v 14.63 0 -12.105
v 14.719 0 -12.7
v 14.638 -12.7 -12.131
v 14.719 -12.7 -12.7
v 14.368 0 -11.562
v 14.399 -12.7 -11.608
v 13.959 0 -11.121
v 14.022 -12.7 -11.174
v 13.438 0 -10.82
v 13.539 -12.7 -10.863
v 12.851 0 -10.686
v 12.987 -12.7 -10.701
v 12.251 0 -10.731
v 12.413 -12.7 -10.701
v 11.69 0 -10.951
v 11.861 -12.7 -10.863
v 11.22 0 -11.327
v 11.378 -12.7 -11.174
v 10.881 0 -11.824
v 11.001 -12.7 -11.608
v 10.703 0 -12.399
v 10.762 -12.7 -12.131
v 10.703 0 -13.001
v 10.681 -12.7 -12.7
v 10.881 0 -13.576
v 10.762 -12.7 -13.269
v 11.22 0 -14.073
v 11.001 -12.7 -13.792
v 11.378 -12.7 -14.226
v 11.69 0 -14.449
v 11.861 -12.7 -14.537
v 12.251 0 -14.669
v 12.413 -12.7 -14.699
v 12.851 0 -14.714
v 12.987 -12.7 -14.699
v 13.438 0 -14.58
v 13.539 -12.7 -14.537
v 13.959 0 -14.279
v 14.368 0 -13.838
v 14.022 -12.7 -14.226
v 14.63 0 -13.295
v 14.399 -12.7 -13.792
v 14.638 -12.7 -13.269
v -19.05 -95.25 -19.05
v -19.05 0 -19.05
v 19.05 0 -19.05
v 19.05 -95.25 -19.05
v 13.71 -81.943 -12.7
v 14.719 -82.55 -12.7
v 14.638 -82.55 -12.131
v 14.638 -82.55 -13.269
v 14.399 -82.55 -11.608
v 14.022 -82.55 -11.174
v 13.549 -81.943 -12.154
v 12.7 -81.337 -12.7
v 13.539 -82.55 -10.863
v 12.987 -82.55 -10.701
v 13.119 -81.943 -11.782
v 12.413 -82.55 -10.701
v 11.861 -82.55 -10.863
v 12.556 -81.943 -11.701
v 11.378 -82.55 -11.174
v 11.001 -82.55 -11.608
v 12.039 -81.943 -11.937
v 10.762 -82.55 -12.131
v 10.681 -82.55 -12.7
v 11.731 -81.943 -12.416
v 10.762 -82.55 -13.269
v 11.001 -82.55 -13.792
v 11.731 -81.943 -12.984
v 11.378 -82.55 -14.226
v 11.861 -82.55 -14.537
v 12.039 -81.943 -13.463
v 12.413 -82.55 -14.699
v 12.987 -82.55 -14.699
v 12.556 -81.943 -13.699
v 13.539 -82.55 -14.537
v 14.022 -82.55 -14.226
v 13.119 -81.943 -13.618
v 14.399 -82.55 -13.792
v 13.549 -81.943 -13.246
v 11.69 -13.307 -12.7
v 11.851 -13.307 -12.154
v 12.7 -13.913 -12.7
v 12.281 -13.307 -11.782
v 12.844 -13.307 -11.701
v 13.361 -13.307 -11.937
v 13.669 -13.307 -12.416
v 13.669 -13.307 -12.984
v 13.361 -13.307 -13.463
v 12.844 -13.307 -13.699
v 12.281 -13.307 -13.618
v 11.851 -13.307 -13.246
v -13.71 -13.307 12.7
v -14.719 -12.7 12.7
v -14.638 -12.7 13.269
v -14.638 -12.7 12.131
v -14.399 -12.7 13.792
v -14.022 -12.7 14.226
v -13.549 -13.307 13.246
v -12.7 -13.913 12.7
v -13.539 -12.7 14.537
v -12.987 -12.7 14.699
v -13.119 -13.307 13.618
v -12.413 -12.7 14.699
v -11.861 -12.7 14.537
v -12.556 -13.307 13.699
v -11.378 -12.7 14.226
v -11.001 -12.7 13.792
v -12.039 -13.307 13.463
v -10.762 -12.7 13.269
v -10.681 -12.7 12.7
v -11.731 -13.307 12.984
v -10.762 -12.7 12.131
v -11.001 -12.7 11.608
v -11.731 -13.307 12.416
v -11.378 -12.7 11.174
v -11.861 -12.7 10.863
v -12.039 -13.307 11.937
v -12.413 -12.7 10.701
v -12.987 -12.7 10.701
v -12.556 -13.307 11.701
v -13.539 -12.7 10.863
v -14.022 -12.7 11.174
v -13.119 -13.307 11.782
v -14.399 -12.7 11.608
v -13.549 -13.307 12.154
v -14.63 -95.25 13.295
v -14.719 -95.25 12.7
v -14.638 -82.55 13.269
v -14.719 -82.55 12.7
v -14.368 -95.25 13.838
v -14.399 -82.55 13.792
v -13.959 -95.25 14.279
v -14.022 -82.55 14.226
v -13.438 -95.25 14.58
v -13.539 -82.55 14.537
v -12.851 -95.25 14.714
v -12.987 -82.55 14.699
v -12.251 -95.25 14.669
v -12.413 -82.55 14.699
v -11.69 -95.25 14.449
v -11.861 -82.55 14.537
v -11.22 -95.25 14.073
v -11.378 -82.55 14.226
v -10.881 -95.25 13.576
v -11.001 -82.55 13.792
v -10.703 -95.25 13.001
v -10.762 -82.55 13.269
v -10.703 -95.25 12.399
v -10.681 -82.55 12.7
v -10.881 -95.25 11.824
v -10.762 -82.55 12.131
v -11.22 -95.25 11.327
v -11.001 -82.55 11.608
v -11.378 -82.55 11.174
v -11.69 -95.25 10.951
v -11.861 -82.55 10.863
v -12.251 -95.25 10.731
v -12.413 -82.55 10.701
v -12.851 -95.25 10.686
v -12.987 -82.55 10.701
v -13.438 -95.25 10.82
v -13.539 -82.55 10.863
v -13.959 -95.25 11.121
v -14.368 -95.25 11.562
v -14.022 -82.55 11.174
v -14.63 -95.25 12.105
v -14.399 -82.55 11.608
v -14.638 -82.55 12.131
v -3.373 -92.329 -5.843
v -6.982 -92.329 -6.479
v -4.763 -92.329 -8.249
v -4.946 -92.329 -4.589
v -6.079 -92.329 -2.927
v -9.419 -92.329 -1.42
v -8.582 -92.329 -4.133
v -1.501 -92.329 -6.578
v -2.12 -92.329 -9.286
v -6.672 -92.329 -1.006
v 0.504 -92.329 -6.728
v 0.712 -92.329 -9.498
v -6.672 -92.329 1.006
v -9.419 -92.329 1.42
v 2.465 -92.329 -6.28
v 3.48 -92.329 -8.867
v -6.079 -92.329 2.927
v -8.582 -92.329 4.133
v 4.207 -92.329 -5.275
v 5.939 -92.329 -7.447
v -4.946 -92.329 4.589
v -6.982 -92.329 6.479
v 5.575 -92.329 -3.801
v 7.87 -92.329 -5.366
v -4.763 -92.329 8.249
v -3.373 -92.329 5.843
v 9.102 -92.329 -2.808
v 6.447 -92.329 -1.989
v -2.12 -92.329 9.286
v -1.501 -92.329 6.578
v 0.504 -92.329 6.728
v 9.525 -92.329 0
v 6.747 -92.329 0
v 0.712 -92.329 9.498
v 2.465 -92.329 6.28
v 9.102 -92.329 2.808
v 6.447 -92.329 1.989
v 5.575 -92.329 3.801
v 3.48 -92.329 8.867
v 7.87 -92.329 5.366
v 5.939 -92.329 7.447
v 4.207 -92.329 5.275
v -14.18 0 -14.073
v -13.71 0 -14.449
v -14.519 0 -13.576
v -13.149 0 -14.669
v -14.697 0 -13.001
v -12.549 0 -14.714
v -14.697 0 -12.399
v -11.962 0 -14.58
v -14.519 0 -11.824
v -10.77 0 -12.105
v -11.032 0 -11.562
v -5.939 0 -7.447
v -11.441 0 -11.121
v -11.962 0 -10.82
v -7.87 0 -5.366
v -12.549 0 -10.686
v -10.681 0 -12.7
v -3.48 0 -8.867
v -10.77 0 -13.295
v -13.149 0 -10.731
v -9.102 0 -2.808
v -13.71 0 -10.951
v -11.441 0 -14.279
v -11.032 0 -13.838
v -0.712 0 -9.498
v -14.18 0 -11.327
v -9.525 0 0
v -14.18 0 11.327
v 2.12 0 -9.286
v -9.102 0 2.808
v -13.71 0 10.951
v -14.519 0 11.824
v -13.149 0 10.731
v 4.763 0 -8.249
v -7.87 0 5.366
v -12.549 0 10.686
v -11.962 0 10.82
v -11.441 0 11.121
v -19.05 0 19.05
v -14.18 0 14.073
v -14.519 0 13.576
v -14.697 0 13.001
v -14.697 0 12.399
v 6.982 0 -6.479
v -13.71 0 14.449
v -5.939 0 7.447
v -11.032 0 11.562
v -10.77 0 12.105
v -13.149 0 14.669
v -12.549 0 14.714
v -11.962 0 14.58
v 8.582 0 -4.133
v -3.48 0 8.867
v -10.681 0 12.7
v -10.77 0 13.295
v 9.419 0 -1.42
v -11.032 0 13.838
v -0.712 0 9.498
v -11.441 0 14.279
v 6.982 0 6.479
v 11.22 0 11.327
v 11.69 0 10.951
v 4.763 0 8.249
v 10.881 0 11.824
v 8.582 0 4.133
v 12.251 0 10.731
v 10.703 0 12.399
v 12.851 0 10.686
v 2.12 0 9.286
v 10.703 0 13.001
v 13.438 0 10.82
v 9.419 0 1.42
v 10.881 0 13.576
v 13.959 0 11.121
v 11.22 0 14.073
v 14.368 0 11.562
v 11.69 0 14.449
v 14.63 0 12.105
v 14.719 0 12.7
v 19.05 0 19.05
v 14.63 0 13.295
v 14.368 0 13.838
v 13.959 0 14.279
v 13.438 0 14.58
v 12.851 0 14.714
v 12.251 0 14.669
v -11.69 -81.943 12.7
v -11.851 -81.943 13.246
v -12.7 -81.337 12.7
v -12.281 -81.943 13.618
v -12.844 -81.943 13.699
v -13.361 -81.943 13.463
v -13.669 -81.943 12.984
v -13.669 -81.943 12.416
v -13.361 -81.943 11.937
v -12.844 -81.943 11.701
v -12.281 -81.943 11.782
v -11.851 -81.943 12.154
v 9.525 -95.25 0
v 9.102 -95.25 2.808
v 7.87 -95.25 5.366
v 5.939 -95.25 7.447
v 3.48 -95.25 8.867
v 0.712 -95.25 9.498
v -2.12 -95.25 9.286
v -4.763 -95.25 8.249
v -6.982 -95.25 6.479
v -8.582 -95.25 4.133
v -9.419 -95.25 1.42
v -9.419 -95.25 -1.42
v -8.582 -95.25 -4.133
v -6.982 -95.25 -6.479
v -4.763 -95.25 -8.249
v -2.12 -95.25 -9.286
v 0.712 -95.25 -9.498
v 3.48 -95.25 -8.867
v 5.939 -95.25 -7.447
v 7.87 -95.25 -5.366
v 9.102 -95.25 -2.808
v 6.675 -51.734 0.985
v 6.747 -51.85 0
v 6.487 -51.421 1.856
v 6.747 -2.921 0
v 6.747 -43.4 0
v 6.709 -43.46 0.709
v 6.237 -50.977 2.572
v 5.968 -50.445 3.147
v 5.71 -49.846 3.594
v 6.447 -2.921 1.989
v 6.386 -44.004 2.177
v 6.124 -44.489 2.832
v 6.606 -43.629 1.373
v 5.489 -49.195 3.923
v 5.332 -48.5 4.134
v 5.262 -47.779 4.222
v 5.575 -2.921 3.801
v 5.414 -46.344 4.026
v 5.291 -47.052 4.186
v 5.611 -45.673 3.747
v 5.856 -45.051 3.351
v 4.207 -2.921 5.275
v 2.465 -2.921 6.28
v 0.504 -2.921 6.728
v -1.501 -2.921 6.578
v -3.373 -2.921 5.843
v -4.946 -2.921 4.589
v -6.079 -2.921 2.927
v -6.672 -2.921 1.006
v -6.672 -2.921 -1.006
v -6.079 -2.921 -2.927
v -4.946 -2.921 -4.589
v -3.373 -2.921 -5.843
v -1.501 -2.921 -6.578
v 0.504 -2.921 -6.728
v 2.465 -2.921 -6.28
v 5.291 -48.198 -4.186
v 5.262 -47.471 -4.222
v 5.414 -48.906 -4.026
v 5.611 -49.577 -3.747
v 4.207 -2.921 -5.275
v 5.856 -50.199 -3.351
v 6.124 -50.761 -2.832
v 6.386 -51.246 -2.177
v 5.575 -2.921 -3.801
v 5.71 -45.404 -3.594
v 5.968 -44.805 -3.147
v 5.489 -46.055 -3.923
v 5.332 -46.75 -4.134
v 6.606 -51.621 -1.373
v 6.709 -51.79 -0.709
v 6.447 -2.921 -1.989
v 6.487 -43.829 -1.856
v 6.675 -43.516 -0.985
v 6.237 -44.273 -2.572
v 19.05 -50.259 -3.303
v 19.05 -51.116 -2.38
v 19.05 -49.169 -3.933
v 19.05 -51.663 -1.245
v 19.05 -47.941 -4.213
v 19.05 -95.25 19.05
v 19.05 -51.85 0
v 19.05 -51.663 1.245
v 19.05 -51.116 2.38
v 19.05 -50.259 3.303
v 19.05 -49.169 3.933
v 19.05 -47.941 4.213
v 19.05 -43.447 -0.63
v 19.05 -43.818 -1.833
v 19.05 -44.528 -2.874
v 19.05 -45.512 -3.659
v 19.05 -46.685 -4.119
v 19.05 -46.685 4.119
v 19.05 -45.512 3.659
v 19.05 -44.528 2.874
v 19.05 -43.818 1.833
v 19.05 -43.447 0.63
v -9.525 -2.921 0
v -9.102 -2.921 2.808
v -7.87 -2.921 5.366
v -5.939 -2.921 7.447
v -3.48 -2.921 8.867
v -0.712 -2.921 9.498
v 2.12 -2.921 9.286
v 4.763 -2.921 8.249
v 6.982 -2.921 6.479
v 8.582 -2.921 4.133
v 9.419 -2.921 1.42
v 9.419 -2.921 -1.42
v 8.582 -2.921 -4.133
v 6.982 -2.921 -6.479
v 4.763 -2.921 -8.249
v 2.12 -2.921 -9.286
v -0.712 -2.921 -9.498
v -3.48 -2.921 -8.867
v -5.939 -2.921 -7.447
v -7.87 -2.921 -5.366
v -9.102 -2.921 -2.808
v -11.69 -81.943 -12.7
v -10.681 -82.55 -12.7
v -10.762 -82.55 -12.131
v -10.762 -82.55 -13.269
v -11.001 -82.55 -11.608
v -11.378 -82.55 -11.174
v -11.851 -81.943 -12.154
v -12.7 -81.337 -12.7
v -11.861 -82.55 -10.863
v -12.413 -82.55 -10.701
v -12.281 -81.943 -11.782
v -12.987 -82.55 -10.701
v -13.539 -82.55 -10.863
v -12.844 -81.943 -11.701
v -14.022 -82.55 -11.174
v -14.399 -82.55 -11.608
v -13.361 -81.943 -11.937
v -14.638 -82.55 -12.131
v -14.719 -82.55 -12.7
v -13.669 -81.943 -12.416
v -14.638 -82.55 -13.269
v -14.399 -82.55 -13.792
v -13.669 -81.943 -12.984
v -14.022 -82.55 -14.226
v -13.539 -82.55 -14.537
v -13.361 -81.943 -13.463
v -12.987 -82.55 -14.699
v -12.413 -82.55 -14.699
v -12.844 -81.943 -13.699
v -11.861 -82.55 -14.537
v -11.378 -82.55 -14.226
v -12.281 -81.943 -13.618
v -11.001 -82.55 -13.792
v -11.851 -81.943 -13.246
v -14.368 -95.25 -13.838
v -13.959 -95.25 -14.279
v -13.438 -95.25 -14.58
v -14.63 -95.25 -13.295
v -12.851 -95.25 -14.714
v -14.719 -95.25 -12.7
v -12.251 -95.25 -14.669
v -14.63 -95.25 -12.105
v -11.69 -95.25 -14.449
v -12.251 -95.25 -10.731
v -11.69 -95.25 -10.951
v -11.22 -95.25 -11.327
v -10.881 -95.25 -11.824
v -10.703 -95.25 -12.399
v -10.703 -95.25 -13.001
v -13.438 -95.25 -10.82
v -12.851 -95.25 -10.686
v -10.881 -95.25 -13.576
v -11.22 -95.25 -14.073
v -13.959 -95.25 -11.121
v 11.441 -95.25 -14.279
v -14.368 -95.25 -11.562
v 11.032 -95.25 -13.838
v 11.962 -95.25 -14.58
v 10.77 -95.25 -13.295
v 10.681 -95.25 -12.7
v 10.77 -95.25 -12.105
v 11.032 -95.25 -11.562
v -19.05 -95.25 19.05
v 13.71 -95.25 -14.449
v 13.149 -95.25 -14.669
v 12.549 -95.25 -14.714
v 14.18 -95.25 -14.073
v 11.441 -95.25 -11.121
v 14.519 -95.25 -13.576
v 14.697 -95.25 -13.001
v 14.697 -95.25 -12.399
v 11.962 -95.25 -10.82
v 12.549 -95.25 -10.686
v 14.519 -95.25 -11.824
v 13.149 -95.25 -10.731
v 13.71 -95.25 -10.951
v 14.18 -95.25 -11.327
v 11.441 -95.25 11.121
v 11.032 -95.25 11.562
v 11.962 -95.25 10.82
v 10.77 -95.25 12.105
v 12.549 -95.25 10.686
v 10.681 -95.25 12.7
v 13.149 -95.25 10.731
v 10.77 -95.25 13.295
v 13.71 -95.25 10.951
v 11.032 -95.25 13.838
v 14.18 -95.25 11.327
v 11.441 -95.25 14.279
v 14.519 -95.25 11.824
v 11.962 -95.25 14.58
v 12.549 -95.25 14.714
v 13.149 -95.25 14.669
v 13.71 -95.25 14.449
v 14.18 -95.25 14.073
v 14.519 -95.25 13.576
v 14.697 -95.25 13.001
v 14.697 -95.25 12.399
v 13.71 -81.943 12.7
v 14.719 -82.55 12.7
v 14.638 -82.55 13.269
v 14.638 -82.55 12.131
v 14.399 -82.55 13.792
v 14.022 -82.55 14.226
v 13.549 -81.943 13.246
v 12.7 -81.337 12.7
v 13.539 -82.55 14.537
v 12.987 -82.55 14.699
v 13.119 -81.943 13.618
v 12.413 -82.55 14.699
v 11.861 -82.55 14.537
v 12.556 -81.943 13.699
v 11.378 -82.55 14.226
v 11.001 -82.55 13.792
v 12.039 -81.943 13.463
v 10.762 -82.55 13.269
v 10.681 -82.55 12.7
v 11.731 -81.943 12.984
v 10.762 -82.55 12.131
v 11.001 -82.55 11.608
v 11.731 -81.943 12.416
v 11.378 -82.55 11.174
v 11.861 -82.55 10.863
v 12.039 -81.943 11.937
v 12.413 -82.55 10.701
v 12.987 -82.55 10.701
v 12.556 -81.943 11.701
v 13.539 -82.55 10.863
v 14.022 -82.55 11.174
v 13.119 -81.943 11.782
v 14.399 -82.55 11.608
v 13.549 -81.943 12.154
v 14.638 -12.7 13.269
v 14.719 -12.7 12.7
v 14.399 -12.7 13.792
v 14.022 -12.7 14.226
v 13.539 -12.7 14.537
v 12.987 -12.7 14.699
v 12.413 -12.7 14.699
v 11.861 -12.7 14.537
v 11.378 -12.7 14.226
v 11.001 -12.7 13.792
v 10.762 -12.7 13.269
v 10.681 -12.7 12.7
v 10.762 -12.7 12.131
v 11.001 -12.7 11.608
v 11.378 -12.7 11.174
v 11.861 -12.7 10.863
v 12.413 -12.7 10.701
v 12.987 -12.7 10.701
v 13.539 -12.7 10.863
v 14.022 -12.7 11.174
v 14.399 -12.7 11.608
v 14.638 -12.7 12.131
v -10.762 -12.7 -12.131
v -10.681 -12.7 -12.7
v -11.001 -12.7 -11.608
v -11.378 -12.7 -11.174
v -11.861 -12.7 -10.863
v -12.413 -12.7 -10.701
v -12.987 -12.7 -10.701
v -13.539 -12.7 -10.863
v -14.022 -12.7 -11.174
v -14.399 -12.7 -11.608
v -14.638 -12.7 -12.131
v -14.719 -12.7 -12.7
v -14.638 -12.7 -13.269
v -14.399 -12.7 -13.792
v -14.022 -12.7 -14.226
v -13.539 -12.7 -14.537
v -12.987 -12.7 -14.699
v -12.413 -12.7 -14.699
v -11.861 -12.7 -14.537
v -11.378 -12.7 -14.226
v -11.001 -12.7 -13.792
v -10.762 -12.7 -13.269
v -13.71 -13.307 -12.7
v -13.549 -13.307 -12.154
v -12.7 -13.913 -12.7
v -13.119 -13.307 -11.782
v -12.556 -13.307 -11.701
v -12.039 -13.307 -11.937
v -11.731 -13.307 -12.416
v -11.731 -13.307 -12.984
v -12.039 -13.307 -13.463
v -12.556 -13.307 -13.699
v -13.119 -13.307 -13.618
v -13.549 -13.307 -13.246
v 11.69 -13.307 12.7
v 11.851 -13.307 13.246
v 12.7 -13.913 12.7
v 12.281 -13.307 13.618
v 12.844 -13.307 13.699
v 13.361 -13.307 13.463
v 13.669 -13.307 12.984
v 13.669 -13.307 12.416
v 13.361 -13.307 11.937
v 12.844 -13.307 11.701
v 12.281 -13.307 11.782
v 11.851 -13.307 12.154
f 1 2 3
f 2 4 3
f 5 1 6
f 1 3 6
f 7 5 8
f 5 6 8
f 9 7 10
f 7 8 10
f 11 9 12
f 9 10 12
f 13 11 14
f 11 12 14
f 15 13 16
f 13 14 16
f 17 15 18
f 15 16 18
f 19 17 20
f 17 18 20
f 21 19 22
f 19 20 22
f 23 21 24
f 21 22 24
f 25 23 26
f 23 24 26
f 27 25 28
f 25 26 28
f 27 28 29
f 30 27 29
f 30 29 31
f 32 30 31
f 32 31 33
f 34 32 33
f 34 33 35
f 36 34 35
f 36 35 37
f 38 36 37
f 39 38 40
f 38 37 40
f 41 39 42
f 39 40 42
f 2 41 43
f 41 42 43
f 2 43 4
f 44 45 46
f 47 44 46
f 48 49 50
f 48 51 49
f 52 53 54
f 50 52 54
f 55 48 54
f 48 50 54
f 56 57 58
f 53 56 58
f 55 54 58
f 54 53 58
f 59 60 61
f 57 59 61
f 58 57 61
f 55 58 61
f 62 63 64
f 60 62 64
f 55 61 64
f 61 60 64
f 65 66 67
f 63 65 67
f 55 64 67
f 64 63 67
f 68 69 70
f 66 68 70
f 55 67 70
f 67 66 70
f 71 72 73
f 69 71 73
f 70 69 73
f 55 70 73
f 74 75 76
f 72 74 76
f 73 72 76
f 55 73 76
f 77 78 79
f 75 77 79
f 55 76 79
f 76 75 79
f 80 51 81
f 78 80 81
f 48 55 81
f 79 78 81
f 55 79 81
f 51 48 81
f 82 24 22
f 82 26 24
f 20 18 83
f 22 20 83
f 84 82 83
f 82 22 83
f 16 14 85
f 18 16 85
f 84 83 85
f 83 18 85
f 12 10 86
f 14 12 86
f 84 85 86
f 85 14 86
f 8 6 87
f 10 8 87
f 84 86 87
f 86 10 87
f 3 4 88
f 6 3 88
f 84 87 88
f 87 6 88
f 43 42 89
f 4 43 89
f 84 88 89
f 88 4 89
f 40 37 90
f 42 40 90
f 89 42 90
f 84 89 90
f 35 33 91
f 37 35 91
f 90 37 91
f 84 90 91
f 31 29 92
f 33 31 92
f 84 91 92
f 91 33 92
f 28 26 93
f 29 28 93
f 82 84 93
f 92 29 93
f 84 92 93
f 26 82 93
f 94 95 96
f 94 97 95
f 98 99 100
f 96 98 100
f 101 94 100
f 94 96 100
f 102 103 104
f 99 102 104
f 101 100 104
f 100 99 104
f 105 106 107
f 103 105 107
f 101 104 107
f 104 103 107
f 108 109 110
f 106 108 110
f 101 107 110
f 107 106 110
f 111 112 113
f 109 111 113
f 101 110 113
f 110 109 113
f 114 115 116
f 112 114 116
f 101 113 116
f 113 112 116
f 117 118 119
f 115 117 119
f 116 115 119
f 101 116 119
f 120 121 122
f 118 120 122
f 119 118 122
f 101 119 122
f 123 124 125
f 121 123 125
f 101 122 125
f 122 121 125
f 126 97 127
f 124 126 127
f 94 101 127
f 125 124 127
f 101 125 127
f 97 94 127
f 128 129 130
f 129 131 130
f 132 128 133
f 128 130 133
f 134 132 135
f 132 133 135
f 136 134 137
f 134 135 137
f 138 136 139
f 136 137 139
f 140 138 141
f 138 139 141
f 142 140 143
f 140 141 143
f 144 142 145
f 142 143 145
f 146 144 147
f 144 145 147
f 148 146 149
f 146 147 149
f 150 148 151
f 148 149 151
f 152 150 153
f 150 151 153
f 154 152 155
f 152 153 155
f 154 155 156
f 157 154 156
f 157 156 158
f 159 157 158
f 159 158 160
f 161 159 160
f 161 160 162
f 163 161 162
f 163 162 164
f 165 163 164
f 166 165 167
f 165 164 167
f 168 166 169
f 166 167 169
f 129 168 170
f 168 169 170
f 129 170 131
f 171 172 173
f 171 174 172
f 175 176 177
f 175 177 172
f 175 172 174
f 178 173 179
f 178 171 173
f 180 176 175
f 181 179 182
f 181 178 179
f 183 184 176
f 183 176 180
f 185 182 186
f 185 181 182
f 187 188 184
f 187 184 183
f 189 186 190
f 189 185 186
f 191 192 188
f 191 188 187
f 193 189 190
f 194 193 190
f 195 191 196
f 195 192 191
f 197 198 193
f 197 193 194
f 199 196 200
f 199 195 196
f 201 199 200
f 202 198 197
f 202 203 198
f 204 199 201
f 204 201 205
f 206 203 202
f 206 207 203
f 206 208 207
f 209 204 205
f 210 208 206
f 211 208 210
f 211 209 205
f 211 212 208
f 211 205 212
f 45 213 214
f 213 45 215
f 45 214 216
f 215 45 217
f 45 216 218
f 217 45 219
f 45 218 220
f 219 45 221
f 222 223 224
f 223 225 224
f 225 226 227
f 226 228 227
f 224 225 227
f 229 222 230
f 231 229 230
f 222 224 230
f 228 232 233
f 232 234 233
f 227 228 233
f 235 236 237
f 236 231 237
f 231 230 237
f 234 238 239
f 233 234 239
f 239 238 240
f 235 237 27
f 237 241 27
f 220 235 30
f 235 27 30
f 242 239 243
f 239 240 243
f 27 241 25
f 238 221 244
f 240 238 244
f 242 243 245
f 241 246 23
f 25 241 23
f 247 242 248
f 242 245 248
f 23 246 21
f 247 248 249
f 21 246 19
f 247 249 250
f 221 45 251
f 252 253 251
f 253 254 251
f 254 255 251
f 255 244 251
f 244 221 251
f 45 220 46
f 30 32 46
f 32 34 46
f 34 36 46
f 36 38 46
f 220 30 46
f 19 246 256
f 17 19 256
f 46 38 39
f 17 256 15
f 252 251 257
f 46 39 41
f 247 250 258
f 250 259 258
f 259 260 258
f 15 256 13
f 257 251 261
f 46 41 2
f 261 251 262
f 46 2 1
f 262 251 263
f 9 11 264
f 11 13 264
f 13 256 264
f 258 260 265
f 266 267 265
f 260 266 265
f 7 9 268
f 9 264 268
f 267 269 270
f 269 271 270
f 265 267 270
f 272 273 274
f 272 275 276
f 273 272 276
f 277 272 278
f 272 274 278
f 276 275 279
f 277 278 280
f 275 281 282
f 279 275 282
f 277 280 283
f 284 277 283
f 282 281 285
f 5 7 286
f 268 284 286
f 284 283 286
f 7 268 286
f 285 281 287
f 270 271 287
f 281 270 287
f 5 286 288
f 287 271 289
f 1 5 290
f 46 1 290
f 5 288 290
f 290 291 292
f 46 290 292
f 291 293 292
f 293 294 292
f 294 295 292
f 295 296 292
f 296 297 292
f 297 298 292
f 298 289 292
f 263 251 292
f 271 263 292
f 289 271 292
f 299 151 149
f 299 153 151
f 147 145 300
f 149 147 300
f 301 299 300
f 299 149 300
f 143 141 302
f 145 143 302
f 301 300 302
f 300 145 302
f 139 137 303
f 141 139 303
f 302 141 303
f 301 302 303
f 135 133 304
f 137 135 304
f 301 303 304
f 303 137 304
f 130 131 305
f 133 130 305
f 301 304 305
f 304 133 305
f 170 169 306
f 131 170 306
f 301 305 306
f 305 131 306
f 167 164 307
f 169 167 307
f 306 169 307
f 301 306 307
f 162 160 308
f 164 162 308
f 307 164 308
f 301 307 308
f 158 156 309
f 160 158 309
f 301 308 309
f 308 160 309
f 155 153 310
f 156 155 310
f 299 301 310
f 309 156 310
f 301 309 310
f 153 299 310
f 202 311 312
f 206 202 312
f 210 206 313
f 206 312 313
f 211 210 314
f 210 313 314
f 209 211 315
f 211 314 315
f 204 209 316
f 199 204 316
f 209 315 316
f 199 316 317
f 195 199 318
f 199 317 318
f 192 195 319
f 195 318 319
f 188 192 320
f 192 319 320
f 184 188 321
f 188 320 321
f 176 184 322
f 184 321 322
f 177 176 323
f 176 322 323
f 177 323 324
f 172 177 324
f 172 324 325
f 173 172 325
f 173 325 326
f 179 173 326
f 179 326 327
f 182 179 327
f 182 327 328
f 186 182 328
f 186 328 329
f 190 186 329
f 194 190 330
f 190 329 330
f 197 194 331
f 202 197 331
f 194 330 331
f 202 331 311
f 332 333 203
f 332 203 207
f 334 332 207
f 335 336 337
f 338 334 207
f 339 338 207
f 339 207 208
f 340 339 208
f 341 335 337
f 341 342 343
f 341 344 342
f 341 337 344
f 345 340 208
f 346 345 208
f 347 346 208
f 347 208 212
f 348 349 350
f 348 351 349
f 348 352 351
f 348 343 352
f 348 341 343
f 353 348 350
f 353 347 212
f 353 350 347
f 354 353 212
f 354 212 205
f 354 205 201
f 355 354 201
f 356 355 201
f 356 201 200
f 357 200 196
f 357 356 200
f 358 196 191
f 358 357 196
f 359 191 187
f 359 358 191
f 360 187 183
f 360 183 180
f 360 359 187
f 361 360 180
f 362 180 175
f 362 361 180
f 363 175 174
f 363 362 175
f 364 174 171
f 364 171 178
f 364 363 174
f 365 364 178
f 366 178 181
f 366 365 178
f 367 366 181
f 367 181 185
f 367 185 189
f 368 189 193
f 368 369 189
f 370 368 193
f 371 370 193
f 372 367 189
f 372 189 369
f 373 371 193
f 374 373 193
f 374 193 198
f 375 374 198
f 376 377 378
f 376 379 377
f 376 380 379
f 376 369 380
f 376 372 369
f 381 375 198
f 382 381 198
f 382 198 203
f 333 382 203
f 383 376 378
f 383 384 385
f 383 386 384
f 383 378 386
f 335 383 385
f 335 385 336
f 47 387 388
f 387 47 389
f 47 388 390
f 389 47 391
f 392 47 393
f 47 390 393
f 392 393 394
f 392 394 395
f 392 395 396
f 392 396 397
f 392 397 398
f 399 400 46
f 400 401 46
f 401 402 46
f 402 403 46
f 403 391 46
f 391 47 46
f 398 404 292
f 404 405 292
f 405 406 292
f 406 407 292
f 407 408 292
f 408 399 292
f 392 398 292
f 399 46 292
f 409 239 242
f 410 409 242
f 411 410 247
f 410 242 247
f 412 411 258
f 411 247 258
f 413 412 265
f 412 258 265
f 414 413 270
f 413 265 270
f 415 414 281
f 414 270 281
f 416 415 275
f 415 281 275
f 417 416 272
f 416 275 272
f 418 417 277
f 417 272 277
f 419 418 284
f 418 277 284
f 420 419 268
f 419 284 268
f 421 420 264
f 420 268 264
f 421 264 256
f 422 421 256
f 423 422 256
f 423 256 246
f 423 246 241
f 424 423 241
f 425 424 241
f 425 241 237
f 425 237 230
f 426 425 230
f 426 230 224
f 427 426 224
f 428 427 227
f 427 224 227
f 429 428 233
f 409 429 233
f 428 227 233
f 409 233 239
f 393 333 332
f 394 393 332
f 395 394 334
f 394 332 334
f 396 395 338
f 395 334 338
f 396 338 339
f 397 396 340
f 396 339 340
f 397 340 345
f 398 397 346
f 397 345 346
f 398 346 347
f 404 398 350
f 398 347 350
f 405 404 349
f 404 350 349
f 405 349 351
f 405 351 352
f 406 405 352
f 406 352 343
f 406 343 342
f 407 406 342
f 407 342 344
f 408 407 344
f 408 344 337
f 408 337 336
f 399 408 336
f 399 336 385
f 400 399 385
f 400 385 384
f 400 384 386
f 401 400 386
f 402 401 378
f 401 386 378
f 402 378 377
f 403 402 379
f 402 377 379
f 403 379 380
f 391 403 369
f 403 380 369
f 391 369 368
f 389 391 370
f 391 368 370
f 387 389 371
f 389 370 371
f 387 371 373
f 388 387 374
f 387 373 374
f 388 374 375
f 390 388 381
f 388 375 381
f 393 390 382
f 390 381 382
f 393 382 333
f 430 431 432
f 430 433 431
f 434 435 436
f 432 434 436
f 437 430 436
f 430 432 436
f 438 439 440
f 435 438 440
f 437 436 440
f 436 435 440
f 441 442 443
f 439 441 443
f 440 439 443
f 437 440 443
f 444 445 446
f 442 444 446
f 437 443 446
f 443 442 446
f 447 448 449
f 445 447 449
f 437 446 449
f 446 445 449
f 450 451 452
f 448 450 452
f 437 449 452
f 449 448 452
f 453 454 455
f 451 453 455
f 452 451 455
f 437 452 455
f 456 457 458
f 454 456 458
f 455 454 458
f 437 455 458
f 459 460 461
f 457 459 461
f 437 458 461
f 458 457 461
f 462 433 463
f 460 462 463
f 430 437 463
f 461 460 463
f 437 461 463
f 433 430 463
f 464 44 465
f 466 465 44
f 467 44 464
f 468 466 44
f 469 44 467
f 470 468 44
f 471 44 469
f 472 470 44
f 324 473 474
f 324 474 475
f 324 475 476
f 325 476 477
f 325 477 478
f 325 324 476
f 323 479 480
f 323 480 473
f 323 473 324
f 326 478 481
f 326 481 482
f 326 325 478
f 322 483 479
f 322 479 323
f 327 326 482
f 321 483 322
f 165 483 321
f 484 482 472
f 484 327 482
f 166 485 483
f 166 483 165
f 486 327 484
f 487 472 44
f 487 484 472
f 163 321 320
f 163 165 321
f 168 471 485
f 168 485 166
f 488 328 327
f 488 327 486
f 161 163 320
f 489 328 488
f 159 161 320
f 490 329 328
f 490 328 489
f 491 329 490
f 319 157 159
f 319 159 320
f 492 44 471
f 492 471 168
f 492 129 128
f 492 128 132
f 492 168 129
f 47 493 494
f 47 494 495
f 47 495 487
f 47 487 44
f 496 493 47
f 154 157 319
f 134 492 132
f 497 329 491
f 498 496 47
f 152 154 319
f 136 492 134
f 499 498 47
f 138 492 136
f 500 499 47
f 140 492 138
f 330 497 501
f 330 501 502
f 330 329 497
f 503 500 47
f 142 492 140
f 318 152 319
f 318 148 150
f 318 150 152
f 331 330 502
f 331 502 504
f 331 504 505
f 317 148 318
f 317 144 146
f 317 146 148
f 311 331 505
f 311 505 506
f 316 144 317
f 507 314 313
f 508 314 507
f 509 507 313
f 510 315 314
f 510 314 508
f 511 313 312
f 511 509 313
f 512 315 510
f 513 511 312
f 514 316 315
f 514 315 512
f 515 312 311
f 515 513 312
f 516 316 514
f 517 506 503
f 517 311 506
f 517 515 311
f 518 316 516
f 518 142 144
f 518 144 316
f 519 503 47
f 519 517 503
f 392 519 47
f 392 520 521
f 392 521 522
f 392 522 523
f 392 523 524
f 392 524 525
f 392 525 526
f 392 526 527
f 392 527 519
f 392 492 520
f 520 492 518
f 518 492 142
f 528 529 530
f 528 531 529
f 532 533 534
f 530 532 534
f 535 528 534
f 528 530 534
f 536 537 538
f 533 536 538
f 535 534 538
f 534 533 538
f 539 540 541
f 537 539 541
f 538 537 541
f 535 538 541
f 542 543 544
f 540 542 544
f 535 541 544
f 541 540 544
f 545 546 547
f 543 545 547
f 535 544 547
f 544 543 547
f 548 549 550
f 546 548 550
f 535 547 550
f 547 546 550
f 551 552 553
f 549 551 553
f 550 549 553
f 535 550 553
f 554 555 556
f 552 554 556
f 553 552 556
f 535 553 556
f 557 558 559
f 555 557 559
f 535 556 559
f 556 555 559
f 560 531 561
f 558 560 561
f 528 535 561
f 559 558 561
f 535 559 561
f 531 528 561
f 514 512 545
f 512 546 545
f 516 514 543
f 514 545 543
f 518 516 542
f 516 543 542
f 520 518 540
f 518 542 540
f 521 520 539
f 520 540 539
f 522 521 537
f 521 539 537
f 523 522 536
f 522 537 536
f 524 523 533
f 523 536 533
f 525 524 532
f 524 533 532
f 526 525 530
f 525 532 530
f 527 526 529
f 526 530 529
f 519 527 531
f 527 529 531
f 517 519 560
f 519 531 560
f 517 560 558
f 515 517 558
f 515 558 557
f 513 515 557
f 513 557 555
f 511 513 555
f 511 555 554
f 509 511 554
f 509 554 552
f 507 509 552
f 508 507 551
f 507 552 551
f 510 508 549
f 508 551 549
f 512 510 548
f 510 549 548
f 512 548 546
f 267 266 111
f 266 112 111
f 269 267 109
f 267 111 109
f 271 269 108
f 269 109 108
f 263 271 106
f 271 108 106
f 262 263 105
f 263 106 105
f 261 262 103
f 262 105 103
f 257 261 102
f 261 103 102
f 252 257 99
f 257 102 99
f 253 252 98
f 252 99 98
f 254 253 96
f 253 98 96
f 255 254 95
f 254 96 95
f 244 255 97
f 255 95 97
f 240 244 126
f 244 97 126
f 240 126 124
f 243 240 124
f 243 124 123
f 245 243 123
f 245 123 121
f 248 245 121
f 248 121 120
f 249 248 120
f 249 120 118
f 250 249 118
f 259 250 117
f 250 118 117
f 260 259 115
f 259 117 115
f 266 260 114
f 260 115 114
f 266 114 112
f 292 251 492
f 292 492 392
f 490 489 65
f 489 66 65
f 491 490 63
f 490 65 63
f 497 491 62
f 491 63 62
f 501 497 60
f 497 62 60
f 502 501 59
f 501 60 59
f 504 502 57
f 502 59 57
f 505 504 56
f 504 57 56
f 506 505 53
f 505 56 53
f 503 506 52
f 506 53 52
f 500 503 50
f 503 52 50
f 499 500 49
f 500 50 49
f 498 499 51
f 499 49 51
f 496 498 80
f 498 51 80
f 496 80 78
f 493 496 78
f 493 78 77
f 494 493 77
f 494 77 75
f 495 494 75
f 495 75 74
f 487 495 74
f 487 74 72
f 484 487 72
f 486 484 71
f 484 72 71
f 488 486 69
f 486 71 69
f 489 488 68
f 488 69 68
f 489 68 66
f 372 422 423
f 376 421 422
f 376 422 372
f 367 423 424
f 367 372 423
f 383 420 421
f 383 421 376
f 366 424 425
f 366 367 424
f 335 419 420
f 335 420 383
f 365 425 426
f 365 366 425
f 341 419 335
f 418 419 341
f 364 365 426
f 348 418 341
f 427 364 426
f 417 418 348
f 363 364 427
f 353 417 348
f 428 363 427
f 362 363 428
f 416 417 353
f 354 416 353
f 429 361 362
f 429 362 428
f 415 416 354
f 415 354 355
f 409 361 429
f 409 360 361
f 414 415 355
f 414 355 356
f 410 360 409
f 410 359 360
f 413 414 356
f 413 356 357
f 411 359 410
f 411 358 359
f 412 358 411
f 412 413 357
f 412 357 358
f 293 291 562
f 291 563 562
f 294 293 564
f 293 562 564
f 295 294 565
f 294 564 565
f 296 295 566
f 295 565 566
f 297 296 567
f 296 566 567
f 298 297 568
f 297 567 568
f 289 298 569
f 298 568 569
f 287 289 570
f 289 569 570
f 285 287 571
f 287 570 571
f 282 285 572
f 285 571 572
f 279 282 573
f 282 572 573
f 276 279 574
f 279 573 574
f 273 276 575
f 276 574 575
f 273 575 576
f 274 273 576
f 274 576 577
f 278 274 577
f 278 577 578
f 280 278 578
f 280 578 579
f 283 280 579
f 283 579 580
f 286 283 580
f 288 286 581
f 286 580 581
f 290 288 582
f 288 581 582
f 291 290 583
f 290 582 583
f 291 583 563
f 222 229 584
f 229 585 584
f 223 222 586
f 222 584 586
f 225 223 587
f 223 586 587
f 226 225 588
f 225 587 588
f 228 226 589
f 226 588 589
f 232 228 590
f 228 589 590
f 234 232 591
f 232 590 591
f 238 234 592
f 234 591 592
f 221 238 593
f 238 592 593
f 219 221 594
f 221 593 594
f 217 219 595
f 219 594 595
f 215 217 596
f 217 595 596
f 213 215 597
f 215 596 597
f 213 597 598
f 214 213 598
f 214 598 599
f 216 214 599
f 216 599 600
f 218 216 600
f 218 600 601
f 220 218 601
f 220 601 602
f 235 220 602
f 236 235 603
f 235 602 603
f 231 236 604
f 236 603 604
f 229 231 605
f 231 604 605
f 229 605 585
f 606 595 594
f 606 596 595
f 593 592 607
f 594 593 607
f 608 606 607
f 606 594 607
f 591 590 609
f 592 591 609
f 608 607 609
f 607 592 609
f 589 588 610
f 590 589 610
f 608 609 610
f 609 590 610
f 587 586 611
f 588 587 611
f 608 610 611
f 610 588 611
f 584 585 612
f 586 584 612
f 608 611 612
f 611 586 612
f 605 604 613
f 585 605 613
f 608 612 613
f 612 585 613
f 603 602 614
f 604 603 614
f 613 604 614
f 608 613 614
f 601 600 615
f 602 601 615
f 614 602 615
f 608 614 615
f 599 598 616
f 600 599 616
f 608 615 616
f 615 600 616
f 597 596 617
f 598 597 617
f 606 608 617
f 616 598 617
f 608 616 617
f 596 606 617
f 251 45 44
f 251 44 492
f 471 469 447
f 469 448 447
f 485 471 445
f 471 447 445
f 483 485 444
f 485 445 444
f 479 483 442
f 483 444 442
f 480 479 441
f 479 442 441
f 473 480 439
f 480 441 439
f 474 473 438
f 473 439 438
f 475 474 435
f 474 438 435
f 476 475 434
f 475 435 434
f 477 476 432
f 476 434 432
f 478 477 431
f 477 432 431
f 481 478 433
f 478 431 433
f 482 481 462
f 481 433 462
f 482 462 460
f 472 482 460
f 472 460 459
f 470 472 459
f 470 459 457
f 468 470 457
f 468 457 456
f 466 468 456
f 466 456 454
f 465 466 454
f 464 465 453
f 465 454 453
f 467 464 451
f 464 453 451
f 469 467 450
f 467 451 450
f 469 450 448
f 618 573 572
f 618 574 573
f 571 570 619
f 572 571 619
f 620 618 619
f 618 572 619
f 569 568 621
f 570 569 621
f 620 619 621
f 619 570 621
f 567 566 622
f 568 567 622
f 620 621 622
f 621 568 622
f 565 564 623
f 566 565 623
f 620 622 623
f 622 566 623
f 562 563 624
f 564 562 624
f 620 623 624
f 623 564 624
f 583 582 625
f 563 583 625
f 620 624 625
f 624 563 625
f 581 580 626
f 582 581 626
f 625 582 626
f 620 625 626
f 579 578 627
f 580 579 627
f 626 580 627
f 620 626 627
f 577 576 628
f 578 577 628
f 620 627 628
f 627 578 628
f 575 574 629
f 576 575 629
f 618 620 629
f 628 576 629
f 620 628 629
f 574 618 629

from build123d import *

# Parameters (mm, degrees)
F0_W      = 38.1
F0_H      = 38.1
F0_R      = 6.746875
F1_DEPTH  = 95.25
F3_D      = 4.0386
F3_DEPTH  = 12.7
F3_TIP    = 1.213317848
F5_D      = 4.0386
F5_DEPTH  = 12.7
F5_TIP    = 1.213317848
F6_R      = 9.525
F6_R_2    = 6.746875
F7_DEPTH  = 2.921
F8_R      = 9.525
F8_R_2    = 6.746875
F9_DEPTH  = 2.921
F11_D     = 8.45058
F11_DEPTH = 15.875
F11_TIP   = 2.538810365


with BuildPart() as f1:
    # F0 (on Front) → F1 (new body)
    with BuildSketch(Plane.XZ):
        Rectangle(F0_W, F0_H)
        Circle(F0_R, mode=Mode.SUBTRACT)
    extrude(amount=F1_DEPTH)

    # F3
    with Locations(Plane(origin=(0, 0, 0), x_dir=(-1, 0, 0), z_dir=(0, 1, 0))):
        with Locations((-12.7, -12.7), (-12.7, 12.7), (12.7, 12.7), (12.7, -12.7)):
            Hole(F3_D / 2, depth=F3_DEPTH)
            with Locations((0, 0, -(F3_DEPTH + F3_TIP / 2))):  # 118° drill point
                Cone(0, F3_D / 2, F3_TIP, mode=Mode.SUBTRACT)

    # F5
    with Locations(Plane.XZ.offset(95.25)):
        with Locations((-12.7, 12.7), (-12.7, -12.7), (12.7, -12.7), (12.7, 12.7)):
            Hole(F5_D / 2, depth=F5_DEPTH)
            with Locations((0, 0, -(F5_DEPTH + F5_TIP / 2))):  # 118° drill point
                Cone(0, F5_D / 2, F5_TIP, mode=Mode.SUBTRACT)

    # F6 (on face) → F7 (cut)
    with BuildSketch(Plane.XZ.offset(95.25)):
        Circle(F6_R)
        Circle(F6_R_2, mode=Mode.SUBTRACT)
    extrude(amount=-F7_DEPTH, mode=Mode.SUBTRACT)

    # F8 (on face) → F9 (cut)
    with BuildSketch(Plane(origin=(0, 0, 0), x_dir=(-1, 0, 0), z_dir=(0, 1, 0))):
        Circle(F8_R)
        Circle(F8_R_2, mode=Mode.SUBTRACT)
    extrude(amount=-F9_DEPTH, mode=Mode.SUBTRACT)

    # F11
    with Locations(Plane.YZ.offset(19.05)):
        with Locations((-47.625, 0)):
            Hole(F11_D / 2, depth=F11_DEPTH)
            with Locations((0, 0, -(F11_DEPTH + F11_TIP / 2))):  # 118° drill point
                Cone(0, F11_D / 2, F11_TIP, mode=Mode.SUBTRACT)


solid = f1.part
